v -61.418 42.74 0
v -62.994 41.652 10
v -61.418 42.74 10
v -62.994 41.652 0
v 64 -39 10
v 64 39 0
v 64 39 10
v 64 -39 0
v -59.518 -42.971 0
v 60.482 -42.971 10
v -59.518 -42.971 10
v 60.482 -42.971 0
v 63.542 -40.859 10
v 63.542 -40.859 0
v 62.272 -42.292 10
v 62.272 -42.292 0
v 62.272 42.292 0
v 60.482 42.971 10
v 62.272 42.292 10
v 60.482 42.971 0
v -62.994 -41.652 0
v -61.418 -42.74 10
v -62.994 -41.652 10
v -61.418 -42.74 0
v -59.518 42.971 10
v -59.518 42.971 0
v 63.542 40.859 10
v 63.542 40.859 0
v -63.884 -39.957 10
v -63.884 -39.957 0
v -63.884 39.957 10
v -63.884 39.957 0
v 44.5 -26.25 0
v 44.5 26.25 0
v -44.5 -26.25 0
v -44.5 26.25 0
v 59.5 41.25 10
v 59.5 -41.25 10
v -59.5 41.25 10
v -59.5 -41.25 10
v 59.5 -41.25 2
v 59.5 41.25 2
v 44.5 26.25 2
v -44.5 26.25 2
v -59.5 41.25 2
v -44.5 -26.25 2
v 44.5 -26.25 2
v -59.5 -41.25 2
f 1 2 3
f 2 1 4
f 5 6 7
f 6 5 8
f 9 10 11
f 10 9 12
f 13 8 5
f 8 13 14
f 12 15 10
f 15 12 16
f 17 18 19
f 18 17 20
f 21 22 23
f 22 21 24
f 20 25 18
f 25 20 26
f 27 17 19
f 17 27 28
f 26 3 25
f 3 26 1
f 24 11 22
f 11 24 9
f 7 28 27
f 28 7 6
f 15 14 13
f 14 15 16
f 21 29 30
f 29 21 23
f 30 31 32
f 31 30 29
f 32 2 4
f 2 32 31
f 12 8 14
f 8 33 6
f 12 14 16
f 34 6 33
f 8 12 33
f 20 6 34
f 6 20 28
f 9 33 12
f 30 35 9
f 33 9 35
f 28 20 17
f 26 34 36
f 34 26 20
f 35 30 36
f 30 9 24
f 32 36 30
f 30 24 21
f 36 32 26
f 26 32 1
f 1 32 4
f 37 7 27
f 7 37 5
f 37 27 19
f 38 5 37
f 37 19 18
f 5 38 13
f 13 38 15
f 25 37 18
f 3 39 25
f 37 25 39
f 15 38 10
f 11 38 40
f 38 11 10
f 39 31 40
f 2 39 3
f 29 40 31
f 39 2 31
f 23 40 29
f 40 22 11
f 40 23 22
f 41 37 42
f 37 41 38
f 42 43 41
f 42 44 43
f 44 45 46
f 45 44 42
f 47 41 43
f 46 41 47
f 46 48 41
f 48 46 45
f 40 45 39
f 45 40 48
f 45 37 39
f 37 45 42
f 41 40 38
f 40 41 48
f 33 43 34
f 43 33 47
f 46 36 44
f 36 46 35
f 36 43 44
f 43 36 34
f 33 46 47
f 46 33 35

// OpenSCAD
outer_length = 128;
outer_width = 86;
outer_height = 10;

inner_length = 119;
inner_width = 82.5;
bottom_thickness = 2;

cutout_length = 89;
cutout_width = 52.5;

corner_radius = 4;

cyl_x_offset = outer_length / 2 - corner_radius;
cyl_y_offset = outer_width / 2 - corner_radius;

difference() {
    hull () {
        translate([ cyl_x_offset,  cyl_y_offset, 0]) cylinder(outer_height, corner_radius, corner_radius);
        translate([-cyl_x_offset,  cyl_y_offset, 0]) cylinder(outer_height, corner_radius, corner_radius);
        translate([ cyl_x_offset, -cyl_y_offset, 0]) cylinder(outer_height, corner_radius, corner_radius);
        translate([-cyl_x_offset, -cyl_y_offset, 0]) cylinder(outer_height, corner_radius, corner_radius);
    }
    translate([0, 0, 12]) cube([119, 82.5, 20], center=true);
    cube([89, 52.5, 30], center=true);
}
